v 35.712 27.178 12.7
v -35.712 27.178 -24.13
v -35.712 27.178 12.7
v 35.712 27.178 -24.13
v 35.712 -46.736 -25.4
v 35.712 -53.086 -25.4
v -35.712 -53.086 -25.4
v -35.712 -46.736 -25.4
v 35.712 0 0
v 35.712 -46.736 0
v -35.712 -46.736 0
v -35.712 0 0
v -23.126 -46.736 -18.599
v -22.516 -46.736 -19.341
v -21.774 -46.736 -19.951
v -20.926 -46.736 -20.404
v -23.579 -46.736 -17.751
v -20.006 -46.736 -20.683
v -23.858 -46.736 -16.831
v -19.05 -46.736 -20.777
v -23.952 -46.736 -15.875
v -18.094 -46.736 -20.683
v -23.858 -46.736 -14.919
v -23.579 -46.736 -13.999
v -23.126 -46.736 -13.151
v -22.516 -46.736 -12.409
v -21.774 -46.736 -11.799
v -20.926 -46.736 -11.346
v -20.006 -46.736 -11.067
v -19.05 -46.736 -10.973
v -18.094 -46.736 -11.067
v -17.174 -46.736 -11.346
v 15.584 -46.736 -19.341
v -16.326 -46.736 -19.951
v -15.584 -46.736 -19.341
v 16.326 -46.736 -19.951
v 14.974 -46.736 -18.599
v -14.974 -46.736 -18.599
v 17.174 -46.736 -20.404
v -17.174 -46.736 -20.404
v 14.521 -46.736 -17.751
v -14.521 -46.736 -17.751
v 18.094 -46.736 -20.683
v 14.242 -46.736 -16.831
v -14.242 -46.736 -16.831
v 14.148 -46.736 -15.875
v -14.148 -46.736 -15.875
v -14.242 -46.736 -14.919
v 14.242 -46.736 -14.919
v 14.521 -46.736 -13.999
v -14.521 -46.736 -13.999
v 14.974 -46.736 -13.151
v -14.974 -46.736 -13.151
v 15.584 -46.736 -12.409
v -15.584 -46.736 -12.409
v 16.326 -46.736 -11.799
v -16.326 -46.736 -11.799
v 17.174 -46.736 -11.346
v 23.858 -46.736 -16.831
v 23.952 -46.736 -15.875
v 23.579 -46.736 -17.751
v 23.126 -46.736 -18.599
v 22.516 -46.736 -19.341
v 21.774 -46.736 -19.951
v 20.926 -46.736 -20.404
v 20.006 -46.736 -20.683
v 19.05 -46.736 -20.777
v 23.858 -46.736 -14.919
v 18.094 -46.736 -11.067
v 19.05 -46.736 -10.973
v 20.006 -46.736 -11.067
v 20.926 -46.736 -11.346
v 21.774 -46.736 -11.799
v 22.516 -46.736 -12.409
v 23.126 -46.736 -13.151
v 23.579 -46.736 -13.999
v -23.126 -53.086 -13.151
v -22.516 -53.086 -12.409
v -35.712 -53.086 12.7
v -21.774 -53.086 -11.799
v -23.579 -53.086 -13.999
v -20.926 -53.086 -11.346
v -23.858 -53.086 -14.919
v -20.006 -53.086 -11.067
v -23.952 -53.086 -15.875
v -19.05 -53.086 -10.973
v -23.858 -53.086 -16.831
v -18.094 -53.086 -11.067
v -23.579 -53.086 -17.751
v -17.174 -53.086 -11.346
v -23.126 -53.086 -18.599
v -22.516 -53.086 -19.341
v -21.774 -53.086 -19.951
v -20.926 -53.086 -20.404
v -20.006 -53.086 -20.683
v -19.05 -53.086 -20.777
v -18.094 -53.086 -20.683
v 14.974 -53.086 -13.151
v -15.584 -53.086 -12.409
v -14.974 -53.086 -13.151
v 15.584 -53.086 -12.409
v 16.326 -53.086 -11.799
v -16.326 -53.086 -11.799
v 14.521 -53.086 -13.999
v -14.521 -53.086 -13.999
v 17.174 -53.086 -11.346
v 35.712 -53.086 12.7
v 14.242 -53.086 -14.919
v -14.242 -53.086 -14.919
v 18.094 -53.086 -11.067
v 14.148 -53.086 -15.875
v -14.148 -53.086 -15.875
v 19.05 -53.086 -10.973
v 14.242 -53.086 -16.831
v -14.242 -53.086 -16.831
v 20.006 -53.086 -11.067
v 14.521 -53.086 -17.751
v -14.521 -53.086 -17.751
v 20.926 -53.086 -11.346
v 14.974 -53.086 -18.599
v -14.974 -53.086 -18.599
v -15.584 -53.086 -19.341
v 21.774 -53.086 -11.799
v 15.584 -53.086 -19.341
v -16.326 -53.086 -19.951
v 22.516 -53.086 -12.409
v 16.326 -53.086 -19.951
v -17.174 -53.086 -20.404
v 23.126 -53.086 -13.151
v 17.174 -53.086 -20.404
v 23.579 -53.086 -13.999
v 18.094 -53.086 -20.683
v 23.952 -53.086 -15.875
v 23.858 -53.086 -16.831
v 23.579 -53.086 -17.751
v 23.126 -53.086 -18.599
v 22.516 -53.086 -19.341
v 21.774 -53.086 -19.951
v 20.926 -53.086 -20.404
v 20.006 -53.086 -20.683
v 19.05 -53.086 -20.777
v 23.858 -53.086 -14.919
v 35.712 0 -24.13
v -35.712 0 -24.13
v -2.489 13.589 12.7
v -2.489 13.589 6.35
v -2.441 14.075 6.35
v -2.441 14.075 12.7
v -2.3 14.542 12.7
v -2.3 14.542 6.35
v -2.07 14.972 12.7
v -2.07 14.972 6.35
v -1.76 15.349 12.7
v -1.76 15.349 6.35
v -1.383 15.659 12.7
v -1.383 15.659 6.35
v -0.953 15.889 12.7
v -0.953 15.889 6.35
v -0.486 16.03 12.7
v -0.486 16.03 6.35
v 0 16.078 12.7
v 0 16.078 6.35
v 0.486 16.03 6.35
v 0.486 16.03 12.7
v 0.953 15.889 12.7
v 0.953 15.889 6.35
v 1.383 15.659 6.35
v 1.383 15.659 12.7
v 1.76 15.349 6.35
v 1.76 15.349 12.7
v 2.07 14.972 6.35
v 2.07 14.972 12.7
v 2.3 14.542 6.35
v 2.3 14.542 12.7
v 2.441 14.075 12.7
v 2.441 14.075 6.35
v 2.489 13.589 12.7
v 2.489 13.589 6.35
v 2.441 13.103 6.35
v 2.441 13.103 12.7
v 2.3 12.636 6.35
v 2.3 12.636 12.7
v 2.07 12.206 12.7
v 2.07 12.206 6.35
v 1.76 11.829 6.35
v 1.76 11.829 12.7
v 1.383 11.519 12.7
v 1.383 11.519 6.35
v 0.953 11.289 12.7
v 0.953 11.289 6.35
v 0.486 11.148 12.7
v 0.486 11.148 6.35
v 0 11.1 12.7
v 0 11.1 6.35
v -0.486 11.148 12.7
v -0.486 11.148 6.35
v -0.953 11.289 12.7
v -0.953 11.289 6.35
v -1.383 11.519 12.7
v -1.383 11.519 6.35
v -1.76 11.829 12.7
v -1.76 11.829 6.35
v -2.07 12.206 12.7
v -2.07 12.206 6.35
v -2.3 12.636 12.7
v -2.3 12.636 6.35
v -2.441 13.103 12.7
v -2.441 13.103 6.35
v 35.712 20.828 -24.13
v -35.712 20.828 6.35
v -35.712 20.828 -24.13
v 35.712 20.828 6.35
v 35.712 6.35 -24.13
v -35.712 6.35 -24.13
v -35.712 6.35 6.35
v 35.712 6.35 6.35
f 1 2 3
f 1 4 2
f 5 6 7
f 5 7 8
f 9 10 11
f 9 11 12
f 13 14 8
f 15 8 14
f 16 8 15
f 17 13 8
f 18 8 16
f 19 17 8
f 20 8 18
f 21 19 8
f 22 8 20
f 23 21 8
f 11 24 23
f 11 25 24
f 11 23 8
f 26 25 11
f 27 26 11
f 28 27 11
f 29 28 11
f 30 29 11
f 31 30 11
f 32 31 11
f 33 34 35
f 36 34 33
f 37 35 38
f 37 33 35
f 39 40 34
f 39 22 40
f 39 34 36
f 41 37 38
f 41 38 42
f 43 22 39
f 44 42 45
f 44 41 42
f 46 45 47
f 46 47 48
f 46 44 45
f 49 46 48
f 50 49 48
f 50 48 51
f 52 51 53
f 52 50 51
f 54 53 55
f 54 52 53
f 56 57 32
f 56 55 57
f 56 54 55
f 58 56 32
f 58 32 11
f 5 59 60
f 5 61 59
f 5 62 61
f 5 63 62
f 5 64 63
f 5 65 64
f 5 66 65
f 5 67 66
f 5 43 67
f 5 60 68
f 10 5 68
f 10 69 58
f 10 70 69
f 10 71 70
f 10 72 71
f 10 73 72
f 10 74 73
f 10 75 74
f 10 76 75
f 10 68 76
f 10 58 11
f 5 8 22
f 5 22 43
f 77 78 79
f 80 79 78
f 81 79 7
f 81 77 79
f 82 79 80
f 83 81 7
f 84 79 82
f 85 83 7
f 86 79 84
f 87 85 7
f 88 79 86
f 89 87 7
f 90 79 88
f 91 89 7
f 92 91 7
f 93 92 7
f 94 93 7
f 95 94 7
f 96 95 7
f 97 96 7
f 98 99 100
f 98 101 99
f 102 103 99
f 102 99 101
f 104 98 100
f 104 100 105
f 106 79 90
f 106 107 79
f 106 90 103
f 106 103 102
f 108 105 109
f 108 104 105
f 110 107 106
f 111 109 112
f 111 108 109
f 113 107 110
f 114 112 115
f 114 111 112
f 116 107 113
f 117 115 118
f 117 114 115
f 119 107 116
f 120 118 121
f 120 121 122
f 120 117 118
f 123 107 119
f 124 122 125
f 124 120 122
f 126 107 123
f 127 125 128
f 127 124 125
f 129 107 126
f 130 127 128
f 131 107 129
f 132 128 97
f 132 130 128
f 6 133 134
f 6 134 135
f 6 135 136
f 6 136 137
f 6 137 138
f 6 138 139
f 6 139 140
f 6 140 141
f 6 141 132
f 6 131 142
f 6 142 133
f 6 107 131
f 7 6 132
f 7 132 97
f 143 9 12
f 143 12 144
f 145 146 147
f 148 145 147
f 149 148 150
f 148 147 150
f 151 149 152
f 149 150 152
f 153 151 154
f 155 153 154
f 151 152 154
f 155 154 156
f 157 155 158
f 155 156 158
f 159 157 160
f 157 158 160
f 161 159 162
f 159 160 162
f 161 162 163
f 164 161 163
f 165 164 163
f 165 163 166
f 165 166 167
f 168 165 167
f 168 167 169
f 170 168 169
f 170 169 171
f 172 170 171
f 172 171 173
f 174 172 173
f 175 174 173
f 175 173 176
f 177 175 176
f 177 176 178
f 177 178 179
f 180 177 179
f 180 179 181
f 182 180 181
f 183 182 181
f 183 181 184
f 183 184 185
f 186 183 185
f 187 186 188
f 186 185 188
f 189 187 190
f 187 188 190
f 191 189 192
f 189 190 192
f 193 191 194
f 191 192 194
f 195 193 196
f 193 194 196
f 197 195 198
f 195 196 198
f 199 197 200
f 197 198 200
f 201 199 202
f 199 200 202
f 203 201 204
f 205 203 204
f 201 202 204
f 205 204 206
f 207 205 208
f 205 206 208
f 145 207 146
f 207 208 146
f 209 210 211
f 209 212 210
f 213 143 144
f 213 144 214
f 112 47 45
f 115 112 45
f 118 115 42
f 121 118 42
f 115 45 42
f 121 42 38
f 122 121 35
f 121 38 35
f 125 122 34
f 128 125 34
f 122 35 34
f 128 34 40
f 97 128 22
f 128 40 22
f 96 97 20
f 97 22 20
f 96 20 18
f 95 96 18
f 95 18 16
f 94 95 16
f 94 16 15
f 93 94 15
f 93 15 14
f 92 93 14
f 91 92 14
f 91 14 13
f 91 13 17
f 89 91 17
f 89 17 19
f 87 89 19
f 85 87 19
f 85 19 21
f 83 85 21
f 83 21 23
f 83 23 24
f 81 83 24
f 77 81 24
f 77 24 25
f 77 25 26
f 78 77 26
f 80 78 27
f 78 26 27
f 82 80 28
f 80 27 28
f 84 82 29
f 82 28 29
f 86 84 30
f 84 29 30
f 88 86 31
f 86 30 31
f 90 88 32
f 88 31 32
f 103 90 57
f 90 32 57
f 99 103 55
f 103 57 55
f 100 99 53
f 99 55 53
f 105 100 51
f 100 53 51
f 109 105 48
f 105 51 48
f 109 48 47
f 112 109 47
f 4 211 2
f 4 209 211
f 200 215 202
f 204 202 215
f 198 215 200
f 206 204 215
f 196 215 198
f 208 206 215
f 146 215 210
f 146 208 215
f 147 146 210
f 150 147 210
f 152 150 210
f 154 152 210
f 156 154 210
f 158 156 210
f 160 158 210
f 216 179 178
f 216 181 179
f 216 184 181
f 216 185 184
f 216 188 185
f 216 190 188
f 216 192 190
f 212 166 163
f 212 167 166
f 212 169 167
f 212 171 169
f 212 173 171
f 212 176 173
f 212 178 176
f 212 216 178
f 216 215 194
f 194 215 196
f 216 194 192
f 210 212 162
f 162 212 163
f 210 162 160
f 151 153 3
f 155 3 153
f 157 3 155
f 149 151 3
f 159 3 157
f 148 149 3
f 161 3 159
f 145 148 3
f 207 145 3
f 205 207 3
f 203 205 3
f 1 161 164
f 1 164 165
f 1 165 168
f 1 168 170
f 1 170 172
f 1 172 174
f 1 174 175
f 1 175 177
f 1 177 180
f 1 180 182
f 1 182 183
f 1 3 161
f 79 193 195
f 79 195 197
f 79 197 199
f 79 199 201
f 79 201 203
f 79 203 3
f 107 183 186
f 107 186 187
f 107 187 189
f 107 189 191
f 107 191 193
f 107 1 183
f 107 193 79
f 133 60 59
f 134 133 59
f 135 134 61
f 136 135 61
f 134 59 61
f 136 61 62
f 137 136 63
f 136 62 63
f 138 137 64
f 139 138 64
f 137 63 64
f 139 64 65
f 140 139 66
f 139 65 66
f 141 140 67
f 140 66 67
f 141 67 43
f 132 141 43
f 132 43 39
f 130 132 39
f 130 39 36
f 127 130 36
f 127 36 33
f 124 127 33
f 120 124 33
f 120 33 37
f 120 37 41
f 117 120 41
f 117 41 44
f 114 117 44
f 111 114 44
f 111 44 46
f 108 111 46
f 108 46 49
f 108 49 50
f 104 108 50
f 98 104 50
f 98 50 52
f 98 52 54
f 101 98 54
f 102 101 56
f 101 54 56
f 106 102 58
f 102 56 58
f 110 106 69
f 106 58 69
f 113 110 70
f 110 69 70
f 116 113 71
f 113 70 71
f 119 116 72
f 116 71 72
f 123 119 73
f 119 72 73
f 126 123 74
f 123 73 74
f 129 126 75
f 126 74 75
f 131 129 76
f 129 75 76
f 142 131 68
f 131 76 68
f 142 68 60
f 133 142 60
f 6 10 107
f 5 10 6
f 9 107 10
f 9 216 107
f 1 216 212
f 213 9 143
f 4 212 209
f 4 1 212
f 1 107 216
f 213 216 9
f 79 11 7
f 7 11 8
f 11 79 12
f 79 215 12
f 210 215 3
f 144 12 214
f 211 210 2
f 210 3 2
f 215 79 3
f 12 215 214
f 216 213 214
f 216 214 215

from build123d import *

# Parameters (mm, degrees)
BOSS_EXTRUDE1_DEPTH         = 35.7124
F_10_CLEARANCE_HOLE1_D      = 4.9784
F_3_8_CLEARANCE_HOLE1_D     = 9.8044
F_3_8_CLEARANCE_HOLE1_DEPTH = 6.35


with BuildPart() as part:
    # Sketch1 → Boss-Extrude1 (new, symmetric)
    with BuildSketch(Plane(origin=(0, 0, 0), x_dir=(0, 0, -1), z_dir=(1, 0, 0))):
        Polygon((24.13, 27.178), (-12.7, 27.178), (-12.7, 0), (-12.7, -53.086), (25.4, -53.086), (25.4, -46.736), (0, -46.736), (0, 0), (24.13, 0), (24.13, 6.35), (-6.35, 6.35), (-6.35, 20.828), (24.13, 20.828), align=None)
    extrude(amount=BOSS_EXTRUDE1_DEPTH, both=True)

    # #10 Clearance Hole1 (through all)
    with Locations(Plane.XY.offset(12.7)):
        with Locations((0, 13.589)):
            Hole(F_10_CLEARANCE_HOLE1_D / 2)

    # 3/8 Clearance Hole1
    with Locations(Plane(origin=(0, -53.086, 0), x_dir=(-1, 0, 0), z_dir=(0, -1, 0))):
        with Locations((-19.05, 15.875), (19.05, 15.875)):
            Hole(F_3_8_CLEARANCE_HOLE1_D / 2, depth=F_3_8_CLEARANCE_HOLE1_DEPTH)


solid = part.part
